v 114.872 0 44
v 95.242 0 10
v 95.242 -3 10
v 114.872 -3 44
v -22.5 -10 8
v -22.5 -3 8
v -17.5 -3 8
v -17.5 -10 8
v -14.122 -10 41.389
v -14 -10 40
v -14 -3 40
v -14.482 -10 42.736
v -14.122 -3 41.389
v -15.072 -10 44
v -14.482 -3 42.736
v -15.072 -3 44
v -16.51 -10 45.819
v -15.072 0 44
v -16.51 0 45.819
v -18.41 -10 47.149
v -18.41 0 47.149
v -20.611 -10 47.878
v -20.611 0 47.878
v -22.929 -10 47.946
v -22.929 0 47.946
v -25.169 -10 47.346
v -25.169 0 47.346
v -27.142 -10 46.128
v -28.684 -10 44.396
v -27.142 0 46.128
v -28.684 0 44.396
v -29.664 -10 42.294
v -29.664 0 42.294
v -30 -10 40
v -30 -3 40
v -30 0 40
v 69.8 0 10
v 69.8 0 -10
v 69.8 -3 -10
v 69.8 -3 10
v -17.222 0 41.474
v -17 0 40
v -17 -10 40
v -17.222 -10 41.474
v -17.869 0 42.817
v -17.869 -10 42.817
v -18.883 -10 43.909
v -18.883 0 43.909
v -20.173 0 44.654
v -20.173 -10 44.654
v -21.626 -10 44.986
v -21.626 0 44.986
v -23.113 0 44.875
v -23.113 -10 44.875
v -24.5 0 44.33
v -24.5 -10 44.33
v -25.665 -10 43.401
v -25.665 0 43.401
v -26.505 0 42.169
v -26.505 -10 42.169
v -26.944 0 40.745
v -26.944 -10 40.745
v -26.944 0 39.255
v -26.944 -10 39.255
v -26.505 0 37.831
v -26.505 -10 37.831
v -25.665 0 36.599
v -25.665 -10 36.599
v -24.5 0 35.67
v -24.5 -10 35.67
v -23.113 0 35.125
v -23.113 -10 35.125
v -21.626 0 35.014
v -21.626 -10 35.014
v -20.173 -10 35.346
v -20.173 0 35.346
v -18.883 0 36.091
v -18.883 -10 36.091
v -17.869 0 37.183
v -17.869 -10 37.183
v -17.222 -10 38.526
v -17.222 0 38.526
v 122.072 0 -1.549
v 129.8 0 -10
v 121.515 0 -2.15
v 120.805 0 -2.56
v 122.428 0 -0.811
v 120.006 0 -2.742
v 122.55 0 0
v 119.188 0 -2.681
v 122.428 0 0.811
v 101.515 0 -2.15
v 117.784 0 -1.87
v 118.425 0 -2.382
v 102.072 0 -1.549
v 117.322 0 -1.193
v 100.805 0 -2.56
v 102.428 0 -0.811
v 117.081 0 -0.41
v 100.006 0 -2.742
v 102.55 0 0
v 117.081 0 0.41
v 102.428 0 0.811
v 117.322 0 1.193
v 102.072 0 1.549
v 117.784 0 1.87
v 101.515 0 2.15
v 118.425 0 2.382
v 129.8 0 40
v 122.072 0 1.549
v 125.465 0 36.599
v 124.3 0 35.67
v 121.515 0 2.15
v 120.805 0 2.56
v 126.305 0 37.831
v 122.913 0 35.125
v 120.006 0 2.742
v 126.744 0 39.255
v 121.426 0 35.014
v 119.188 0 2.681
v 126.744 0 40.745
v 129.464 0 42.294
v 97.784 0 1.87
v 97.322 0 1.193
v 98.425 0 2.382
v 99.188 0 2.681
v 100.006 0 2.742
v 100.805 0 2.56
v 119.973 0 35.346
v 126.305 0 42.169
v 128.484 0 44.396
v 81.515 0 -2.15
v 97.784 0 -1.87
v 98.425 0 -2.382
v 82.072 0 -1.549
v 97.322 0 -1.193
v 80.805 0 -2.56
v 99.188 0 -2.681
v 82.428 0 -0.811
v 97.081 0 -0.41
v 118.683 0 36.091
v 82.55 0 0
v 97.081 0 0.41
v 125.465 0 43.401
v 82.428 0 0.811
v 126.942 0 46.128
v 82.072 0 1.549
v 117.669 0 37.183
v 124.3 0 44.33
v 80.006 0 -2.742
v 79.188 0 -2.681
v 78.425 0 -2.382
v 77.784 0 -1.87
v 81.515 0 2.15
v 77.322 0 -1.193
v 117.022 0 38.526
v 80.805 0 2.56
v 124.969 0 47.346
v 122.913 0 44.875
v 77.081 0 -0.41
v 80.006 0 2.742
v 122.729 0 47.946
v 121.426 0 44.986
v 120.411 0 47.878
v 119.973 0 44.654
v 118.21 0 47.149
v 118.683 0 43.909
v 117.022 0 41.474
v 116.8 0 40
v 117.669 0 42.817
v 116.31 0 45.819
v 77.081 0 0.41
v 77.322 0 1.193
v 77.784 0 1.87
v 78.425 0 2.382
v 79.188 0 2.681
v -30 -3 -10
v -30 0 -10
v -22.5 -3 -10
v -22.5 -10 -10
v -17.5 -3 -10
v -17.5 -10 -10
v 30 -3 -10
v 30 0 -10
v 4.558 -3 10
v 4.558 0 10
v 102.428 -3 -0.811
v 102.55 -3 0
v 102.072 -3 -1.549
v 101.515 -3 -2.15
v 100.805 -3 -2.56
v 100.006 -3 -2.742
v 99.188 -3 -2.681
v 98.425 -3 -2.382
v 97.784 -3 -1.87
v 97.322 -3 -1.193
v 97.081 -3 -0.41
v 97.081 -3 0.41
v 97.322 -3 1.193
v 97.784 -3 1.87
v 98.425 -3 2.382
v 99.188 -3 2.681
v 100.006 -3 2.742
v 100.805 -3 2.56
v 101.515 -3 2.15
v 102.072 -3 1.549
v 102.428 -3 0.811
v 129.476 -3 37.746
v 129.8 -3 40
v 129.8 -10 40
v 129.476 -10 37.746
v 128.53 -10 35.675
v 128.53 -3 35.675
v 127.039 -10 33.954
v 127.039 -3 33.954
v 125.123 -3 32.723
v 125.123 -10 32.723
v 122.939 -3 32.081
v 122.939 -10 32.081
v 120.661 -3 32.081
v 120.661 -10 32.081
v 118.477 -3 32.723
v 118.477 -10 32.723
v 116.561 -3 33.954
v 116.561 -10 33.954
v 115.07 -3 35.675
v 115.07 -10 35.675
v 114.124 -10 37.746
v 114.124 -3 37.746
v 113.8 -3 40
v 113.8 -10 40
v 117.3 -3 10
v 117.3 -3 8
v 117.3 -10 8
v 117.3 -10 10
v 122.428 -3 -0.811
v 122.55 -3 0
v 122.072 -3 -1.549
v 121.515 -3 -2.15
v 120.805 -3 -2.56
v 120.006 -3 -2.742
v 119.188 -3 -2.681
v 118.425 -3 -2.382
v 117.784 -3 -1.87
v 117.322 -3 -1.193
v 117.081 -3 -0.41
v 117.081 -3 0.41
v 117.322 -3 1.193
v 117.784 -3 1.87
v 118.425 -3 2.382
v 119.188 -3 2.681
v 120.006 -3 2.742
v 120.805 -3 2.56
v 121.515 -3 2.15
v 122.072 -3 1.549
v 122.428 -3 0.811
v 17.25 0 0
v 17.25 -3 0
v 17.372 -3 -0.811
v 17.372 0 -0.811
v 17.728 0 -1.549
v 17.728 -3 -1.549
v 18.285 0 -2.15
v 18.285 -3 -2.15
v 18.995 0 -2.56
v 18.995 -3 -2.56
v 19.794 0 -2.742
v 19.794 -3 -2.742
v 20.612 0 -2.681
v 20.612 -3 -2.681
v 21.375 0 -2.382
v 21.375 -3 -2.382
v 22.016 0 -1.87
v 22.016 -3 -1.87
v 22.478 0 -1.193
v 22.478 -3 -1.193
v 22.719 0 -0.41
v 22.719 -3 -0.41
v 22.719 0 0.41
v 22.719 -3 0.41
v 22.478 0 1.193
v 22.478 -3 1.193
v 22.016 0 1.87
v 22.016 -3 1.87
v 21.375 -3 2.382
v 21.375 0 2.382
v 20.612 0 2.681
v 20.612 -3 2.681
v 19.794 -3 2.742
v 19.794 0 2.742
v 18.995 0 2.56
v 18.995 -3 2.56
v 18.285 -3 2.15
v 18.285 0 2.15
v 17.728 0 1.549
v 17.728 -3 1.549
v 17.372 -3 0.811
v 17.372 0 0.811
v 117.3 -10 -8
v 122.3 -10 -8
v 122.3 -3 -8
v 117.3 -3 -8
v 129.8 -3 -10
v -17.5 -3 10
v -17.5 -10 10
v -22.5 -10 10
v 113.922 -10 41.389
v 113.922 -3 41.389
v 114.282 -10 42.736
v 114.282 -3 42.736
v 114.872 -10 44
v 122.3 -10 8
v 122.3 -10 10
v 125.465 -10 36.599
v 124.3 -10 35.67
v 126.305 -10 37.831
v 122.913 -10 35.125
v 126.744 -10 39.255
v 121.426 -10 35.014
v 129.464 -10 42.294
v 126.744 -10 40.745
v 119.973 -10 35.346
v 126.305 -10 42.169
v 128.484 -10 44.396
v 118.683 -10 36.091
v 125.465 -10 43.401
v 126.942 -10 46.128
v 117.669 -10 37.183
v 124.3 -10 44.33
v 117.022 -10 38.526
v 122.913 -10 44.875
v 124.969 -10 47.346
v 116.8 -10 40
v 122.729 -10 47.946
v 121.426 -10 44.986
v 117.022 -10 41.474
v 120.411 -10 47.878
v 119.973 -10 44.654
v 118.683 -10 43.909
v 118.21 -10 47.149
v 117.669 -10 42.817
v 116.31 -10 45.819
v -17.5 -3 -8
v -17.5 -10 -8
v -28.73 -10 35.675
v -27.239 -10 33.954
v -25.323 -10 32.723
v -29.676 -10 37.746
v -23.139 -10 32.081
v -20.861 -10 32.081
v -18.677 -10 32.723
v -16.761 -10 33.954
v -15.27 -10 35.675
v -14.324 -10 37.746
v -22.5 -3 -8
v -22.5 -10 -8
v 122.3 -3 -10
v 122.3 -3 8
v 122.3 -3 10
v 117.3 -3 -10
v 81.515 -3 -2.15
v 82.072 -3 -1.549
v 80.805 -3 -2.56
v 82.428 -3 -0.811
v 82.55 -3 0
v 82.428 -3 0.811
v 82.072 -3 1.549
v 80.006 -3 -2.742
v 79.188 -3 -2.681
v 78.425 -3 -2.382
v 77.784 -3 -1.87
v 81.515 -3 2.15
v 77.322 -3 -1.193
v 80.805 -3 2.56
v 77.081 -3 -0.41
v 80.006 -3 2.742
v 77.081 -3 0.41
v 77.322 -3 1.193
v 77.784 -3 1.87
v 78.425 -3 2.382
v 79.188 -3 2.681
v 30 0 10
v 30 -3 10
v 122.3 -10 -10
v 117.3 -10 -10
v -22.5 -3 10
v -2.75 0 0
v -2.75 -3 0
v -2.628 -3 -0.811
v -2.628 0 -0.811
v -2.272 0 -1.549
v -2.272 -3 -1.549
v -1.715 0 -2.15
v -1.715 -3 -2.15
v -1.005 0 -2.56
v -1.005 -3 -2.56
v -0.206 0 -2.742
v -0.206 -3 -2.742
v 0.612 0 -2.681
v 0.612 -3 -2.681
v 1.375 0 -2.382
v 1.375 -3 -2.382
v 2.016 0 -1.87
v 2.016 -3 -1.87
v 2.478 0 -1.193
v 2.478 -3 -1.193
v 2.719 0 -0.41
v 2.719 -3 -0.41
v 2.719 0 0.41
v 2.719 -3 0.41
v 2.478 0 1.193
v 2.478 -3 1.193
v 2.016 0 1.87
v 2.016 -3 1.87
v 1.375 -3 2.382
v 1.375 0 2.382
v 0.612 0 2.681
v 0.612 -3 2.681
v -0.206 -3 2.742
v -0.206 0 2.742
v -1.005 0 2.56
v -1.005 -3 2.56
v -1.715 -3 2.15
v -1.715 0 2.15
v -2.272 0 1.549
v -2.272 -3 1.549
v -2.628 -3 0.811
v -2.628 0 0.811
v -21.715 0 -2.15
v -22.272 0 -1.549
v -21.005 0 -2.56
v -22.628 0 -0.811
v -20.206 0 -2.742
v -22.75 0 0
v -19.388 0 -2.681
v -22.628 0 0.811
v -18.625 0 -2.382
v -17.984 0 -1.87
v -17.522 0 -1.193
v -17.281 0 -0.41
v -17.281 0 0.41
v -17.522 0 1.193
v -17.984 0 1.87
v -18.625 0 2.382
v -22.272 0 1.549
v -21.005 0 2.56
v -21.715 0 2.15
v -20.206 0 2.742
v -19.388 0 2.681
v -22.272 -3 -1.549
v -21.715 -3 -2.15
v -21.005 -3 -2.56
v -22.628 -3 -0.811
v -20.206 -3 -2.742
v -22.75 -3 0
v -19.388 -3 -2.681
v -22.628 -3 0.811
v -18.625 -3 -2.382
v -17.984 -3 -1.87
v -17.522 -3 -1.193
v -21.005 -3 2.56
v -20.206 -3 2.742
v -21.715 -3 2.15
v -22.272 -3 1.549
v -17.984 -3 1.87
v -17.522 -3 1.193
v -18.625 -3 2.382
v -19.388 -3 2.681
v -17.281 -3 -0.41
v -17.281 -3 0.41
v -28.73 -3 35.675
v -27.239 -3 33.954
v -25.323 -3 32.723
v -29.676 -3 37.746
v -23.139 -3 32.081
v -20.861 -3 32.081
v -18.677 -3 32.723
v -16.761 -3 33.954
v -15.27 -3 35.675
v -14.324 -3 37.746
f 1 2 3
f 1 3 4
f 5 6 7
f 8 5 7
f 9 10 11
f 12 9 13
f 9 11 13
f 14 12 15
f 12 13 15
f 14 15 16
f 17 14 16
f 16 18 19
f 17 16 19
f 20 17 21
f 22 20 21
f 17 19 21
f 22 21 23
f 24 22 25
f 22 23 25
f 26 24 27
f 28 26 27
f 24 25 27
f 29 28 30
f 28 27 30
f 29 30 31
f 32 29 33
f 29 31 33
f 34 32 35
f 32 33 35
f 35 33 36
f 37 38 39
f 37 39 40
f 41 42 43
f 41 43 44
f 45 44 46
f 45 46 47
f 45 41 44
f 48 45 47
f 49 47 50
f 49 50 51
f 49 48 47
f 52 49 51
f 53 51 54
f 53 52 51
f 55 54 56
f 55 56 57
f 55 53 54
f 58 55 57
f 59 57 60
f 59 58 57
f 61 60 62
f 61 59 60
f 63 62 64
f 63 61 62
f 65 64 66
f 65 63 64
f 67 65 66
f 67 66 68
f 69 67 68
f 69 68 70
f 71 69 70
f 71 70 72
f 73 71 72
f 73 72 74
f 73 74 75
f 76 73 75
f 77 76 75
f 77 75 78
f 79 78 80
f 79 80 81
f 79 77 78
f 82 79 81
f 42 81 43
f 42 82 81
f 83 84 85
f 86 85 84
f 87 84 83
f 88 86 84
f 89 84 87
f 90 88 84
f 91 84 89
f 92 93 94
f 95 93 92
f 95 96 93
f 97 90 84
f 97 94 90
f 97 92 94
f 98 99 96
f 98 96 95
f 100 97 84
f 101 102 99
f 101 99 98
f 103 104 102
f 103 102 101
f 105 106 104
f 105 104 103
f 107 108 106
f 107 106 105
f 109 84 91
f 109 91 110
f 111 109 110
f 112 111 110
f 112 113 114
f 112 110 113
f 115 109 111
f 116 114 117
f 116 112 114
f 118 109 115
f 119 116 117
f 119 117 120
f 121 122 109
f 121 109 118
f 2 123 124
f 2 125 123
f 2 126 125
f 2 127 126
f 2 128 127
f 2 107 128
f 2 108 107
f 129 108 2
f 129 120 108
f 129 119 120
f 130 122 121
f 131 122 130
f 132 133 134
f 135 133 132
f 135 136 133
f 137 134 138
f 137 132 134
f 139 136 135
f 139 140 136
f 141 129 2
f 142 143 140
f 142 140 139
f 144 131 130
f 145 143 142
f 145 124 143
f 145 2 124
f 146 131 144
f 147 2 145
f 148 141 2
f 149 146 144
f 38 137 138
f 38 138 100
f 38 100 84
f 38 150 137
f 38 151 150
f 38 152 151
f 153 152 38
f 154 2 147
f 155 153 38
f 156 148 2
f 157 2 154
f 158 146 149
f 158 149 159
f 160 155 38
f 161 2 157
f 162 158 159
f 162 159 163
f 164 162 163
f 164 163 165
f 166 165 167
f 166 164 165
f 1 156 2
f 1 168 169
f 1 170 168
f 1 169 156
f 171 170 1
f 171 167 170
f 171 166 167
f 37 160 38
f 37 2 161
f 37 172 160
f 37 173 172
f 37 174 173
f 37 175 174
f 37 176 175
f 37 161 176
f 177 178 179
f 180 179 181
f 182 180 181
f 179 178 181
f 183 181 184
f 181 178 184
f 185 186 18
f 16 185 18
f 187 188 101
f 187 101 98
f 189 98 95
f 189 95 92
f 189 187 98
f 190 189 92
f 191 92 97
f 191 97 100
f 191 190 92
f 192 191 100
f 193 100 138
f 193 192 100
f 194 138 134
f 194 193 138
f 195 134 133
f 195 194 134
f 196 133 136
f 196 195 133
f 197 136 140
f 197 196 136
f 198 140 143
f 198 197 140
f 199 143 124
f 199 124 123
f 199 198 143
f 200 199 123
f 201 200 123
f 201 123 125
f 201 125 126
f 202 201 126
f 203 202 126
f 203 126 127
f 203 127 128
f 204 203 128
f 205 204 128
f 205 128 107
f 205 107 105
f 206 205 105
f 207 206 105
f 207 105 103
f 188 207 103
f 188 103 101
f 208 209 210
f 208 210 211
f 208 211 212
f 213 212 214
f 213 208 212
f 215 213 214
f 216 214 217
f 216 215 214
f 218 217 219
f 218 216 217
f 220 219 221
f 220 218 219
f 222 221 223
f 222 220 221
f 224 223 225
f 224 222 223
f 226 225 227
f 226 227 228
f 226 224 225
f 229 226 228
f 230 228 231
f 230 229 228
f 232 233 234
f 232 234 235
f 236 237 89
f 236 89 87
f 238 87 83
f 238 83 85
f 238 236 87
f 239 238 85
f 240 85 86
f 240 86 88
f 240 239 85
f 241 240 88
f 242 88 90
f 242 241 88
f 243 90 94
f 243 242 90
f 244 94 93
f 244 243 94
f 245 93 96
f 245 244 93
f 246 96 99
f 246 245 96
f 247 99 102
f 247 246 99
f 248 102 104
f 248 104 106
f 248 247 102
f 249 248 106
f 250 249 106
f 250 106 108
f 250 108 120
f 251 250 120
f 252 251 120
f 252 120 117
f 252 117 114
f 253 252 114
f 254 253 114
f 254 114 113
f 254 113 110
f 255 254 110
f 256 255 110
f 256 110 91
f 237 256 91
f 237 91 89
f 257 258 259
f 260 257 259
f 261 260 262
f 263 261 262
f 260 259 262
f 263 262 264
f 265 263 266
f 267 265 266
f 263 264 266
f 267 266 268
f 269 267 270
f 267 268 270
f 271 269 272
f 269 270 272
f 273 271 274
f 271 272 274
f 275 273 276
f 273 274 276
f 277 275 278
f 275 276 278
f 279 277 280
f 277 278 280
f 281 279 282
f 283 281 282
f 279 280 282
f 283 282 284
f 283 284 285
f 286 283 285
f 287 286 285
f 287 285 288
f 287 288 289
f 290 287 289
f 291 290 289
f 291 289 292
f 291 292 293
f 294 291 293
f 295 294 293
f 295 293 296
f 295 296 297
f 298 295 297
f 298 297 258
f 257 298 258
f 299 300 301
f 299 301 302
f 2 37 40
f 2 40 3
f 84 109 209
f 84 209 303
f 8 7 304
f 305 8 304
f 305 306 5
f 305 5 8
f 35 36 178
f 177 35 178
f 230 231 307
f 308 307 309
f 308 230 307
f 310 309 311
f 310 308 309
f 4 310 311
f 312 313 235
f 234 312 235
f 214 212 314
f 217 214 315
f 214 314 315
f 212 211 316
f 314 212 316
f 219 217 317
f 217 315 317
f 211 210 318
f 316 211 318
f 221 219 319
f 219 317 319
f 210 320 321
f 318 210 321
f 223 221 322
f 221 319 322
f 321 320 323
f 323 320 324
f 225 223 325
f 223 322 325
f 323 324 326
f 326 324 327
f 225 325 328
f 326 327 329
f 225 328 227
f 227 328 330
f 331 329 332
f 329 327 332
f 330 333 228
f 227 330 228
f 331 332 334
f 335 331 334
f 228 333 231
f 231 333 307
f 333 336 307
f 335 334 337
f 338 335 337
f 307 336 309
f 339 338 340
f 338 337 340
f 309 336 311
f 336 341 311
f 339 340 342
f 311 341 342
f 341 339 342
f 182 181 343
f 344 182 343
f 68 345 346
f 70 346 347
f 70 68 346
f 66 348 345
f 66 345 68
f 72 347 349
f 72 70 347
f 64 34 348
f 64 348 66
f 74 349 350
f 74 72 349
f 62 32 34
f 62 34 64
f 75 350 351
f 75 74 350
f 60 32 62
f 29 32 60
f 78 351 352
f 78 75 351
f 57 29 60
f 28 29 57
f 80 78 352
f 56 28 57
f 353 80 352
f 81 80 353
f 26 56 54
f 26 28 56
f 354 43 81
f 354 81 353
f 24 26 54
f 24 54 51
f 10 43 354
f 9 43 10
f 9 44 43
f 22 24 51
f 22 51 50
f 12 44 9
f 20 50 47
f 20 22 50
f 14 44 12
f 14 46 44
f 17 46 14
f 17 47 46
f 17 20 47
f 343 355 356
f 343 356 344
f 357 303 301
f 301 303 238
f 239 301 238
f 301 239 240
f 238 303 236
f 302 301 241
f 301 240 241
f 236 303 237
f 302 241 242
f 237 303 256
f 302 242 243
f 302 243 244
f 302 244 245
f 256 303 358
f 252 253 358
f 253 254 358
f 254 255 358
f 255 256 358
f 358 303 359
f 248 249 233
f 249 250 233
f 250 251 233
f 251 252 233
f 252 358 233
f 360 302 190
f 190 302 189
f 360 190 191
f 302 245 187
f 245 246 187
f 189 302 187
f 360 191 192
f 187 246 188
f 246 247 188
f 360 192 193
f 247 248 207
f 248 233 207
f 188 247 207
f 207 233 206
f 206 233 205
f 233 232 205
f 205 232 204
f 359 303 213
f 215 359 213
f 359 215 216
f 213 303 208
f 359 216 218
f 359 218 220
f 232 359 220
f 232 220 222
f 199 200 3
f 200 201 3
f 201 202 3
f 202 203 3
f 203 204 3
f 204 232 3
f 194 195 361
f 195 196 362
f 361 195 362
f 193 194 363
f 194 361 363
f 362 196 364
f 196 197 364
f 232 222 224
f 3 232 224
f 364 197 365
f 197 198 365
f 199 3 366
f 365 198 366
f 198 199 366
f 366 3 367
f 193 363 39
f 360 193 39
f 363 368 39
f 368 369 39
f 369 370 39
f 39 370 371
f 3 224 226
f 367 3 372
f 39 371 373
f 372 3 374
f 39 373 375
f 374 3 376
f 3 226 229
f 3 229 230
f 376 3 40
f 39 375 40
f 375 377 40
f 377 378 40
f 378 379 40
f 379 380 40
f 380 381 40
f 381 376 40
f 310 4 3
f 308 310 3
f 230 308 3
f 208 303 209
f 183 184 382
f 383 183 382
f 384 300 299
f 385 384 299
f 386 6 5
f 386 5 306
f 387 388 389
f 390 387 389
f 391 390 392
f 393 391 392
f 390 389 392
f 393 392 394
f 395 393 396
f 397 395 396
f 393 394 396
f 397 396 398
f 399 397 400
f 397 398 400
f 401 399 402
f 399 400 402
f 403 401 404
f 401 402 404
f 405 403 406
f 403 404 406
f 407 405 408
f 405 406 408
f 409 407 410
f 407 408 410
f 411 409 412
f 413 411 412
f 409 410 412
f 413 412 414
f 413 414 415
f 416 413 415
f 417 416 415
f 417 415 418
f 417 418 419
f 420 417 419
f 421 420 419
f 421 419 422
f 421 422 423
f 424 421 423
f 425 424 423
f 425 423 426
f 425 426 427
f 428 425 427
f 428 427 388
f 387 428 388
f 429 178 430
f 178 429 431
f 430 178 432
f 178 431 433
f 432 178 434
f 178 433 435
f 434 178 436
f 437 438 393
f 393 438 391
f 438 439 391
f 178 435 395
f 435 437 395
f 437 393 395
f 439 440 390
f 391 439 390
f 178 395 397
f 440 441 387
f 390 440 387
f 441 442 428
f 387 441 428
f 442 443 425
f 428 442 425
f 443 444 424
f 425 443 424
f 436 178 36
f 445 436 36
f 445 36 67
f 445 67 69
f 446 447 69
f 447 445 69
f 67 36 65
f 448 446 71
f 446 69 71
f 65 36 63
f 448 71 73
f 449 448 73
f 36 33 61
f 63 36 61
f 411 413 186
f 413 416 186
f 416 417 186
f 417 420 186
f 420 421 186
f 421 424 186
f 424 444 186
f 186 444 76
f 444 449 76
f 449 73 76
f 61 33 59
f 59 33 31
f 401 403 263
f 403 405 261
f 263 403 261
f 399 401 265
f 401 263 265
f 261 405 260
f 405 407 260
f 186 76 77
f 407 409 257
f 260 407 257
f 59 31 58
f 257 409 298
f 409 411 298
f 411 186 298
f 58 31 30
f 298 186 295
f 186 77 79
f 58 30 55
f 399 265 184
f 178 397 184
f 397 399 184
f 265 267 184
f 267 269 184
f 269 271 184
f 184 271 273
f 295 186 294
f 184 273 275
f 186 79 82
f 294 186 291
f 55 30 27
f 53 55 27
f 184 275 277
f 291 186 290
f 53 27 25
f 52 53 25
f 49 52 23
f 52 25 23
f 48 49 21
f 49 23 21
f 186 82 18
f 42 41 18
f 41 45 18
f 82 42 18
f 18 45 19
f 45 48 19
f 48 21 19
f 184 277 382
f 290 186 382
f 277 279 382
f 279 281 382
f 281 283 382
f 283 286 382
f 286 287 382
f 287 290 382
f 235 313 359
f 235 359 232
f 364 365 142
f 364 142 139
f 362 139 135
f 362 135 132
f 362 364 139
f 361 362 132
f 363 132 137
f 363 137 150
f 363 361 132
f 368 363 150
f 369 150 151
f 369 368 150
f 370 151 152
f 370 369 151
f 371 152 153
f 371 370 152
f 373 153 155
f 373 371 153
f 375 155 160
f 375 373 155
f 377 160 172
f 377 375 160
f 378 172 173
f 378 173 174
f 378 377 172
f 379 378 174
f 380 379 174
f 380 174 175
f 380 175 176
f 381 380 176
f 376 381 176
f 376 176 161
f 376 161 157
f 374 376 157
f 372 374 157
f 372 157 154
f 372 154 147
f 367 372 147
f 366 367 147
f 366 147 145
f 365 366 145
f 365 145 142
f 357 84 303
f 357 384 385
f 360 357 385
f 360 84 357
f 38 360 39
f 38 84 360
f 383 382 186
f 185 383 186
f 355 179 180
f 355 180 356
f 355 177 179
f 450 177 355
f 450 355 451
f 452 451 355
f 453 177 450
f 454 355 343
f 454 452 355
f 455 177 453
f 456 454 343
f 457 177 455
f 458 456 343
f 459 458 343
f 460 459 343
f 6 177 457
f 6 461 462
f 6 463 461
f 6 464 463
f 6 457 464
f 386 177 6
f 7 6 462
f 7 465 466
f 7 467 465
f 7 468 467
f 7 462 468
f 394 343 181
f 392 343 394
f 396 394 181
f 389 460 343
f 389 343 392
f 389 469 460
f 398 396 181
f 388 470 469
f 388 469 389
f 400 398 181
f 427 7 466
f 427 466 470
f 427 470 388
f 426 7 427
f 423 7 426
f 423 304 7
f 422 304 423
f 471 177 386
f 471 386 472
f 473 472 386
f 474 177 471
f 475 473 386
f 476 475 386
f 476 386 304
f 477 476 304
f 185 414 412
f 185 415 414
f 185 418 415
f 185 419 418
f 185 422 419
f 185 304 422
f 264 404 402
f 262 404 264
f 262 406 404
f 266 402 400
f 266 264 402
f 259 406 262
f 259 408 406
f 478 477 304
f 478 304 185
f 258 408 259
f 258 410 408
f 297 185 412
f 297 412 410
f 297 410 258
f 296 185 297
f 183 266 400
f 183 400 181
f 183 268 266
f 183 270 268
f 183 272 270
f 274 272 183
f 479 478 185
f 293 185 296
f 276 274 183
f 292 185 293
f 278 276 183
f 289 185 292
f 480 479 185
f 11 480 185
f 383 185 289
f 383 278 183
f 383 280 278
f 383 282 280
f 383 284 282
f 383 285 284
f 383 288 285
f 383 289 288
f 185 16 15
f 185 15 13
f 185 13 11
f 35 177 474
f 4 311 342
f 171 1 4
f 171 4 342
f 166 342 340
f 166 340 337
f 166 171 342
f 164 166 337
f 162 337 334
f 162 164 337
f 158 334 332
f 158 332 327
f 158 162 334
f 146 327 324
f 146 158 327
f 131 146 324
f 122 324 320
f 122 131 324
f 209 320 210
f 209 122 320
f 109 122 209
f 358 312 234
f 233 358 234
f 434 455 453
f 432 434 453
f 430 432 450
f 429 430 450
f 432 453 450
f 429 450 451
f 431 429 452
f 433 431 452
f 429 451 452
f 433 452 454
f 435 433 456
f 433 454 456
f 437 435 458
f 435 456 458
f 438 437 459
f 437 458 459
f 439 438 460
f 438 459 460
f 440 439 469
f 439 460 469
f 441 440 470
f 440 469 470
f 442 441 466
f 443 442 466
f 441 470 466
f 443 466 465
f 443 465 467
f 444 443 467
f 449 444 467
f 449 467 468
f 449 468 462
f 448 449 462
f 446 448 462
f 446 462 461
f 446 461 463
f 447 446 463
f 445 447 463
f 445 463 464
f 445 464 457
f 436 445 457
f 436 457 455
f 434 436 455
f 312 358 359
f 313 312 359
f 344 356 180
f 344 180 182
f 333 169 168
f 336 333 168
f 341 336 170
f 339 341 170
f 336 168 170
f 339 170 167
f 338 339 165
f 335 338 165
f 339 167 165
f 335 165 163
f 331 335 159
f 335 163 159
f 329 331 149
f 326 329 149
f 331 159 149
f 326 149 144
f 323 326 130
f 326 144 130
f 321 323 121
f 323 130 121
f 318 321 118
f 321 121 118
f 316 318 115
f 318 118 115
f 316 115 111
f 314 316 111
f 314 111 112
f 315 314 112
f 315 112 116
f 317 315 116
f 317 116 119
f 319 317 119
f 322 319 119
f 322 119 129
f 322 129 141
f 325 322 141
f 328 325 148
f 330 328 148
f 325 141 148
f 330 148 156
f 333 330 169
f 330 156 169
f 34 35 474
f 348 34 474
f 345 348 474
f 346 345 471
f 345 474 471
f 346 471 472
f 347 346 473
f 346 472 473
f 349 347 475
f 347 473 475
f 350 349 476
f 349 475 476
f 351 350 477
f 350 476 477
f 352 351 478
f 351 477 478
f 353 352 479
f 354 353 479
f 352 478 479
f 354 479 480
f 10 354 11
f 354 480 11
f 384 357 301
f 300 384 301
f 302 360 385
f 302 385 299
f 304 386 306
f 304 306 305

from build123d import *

# Parameters (mm, degrees)
F1_DEPTH = 3
F0_W     = 5
F0_H     = 2
F0_R     = 5
F2_DEPTH = 10
F3_D     = 5.5


with BuildPart() as f1:
    # F0 (on Front) → F1 (new body)
    with BuildSketch(Plane.XZ):
        Polygon((-22.5, 10), (-30, 10), (-30, -10), (-22.5, -10), (-22.5, -8), (-17.5, -8), (-17.5, -10), (30, -10), (30, 10), (4.5581123827, 10), (-17.5, 10), (-17.5, 8), (-22.5, 8), align=None)
        with BuildLine():
            Line((-30, 40), (-30, 10))
            Line((-30, 10), (-22.5, 10))
            Line((-22.5, 10), (-17.5, 10))
            Line((-17.5, 10), (4.5581123827, 10))
            Line((4.5581123827, 10), (-15.0717967697, 44))
            ThreePointArc((-15.0717967697, 44), (-14.2725933897, 42.0705523608), (-14, 40))
            ThreePointArc((-14, 40), (-22, 32), (-30, 40))
        make_face()
    extrude(amount=F1_DEPTH)

    # F0 (on Front) → F2 (join)
    with BuildSketch(Plane.XZ):
        with Locations((-20, 9)):
            Rectangle(F0_W, F0_H)
        with Locations((-20, -9)):
            Rectangle(F0_W, F0_H)
        with BuildLine():
            ThreePointArc((-15.0717967697, 44), (-24.0705523608, 47.7274066103), (-30, 40))
            ThreePointArc((-30, 40), (-22, 32), (-14, 40))
            ThreePointArc((-14, 40), (-14.2725933897, 42.0705523608), (-15.0717967697, 44))
        make_face()
        with Locations((-22, 40)):
            Circle(F0_R, mode=Mode.SUBTRACT)
    extrude(amount=F2_DEPTH)

    # F3 (through all)
    with Locations(Plane(origin=(0, 0, 0), x_dir=(1, 0, 0), z_dir=(0, 1, 0))):
        with Locations((-20, 0), (20, 0), (0, 0)):
            Hole(F3_D / 2)


with BuildPart() as f5_1:
    # F5: instance of F1
    add(f1.part.mirror(Plane.YZ.offset(49.9)))


solid = Compound([f1.part, f5_1.part])
